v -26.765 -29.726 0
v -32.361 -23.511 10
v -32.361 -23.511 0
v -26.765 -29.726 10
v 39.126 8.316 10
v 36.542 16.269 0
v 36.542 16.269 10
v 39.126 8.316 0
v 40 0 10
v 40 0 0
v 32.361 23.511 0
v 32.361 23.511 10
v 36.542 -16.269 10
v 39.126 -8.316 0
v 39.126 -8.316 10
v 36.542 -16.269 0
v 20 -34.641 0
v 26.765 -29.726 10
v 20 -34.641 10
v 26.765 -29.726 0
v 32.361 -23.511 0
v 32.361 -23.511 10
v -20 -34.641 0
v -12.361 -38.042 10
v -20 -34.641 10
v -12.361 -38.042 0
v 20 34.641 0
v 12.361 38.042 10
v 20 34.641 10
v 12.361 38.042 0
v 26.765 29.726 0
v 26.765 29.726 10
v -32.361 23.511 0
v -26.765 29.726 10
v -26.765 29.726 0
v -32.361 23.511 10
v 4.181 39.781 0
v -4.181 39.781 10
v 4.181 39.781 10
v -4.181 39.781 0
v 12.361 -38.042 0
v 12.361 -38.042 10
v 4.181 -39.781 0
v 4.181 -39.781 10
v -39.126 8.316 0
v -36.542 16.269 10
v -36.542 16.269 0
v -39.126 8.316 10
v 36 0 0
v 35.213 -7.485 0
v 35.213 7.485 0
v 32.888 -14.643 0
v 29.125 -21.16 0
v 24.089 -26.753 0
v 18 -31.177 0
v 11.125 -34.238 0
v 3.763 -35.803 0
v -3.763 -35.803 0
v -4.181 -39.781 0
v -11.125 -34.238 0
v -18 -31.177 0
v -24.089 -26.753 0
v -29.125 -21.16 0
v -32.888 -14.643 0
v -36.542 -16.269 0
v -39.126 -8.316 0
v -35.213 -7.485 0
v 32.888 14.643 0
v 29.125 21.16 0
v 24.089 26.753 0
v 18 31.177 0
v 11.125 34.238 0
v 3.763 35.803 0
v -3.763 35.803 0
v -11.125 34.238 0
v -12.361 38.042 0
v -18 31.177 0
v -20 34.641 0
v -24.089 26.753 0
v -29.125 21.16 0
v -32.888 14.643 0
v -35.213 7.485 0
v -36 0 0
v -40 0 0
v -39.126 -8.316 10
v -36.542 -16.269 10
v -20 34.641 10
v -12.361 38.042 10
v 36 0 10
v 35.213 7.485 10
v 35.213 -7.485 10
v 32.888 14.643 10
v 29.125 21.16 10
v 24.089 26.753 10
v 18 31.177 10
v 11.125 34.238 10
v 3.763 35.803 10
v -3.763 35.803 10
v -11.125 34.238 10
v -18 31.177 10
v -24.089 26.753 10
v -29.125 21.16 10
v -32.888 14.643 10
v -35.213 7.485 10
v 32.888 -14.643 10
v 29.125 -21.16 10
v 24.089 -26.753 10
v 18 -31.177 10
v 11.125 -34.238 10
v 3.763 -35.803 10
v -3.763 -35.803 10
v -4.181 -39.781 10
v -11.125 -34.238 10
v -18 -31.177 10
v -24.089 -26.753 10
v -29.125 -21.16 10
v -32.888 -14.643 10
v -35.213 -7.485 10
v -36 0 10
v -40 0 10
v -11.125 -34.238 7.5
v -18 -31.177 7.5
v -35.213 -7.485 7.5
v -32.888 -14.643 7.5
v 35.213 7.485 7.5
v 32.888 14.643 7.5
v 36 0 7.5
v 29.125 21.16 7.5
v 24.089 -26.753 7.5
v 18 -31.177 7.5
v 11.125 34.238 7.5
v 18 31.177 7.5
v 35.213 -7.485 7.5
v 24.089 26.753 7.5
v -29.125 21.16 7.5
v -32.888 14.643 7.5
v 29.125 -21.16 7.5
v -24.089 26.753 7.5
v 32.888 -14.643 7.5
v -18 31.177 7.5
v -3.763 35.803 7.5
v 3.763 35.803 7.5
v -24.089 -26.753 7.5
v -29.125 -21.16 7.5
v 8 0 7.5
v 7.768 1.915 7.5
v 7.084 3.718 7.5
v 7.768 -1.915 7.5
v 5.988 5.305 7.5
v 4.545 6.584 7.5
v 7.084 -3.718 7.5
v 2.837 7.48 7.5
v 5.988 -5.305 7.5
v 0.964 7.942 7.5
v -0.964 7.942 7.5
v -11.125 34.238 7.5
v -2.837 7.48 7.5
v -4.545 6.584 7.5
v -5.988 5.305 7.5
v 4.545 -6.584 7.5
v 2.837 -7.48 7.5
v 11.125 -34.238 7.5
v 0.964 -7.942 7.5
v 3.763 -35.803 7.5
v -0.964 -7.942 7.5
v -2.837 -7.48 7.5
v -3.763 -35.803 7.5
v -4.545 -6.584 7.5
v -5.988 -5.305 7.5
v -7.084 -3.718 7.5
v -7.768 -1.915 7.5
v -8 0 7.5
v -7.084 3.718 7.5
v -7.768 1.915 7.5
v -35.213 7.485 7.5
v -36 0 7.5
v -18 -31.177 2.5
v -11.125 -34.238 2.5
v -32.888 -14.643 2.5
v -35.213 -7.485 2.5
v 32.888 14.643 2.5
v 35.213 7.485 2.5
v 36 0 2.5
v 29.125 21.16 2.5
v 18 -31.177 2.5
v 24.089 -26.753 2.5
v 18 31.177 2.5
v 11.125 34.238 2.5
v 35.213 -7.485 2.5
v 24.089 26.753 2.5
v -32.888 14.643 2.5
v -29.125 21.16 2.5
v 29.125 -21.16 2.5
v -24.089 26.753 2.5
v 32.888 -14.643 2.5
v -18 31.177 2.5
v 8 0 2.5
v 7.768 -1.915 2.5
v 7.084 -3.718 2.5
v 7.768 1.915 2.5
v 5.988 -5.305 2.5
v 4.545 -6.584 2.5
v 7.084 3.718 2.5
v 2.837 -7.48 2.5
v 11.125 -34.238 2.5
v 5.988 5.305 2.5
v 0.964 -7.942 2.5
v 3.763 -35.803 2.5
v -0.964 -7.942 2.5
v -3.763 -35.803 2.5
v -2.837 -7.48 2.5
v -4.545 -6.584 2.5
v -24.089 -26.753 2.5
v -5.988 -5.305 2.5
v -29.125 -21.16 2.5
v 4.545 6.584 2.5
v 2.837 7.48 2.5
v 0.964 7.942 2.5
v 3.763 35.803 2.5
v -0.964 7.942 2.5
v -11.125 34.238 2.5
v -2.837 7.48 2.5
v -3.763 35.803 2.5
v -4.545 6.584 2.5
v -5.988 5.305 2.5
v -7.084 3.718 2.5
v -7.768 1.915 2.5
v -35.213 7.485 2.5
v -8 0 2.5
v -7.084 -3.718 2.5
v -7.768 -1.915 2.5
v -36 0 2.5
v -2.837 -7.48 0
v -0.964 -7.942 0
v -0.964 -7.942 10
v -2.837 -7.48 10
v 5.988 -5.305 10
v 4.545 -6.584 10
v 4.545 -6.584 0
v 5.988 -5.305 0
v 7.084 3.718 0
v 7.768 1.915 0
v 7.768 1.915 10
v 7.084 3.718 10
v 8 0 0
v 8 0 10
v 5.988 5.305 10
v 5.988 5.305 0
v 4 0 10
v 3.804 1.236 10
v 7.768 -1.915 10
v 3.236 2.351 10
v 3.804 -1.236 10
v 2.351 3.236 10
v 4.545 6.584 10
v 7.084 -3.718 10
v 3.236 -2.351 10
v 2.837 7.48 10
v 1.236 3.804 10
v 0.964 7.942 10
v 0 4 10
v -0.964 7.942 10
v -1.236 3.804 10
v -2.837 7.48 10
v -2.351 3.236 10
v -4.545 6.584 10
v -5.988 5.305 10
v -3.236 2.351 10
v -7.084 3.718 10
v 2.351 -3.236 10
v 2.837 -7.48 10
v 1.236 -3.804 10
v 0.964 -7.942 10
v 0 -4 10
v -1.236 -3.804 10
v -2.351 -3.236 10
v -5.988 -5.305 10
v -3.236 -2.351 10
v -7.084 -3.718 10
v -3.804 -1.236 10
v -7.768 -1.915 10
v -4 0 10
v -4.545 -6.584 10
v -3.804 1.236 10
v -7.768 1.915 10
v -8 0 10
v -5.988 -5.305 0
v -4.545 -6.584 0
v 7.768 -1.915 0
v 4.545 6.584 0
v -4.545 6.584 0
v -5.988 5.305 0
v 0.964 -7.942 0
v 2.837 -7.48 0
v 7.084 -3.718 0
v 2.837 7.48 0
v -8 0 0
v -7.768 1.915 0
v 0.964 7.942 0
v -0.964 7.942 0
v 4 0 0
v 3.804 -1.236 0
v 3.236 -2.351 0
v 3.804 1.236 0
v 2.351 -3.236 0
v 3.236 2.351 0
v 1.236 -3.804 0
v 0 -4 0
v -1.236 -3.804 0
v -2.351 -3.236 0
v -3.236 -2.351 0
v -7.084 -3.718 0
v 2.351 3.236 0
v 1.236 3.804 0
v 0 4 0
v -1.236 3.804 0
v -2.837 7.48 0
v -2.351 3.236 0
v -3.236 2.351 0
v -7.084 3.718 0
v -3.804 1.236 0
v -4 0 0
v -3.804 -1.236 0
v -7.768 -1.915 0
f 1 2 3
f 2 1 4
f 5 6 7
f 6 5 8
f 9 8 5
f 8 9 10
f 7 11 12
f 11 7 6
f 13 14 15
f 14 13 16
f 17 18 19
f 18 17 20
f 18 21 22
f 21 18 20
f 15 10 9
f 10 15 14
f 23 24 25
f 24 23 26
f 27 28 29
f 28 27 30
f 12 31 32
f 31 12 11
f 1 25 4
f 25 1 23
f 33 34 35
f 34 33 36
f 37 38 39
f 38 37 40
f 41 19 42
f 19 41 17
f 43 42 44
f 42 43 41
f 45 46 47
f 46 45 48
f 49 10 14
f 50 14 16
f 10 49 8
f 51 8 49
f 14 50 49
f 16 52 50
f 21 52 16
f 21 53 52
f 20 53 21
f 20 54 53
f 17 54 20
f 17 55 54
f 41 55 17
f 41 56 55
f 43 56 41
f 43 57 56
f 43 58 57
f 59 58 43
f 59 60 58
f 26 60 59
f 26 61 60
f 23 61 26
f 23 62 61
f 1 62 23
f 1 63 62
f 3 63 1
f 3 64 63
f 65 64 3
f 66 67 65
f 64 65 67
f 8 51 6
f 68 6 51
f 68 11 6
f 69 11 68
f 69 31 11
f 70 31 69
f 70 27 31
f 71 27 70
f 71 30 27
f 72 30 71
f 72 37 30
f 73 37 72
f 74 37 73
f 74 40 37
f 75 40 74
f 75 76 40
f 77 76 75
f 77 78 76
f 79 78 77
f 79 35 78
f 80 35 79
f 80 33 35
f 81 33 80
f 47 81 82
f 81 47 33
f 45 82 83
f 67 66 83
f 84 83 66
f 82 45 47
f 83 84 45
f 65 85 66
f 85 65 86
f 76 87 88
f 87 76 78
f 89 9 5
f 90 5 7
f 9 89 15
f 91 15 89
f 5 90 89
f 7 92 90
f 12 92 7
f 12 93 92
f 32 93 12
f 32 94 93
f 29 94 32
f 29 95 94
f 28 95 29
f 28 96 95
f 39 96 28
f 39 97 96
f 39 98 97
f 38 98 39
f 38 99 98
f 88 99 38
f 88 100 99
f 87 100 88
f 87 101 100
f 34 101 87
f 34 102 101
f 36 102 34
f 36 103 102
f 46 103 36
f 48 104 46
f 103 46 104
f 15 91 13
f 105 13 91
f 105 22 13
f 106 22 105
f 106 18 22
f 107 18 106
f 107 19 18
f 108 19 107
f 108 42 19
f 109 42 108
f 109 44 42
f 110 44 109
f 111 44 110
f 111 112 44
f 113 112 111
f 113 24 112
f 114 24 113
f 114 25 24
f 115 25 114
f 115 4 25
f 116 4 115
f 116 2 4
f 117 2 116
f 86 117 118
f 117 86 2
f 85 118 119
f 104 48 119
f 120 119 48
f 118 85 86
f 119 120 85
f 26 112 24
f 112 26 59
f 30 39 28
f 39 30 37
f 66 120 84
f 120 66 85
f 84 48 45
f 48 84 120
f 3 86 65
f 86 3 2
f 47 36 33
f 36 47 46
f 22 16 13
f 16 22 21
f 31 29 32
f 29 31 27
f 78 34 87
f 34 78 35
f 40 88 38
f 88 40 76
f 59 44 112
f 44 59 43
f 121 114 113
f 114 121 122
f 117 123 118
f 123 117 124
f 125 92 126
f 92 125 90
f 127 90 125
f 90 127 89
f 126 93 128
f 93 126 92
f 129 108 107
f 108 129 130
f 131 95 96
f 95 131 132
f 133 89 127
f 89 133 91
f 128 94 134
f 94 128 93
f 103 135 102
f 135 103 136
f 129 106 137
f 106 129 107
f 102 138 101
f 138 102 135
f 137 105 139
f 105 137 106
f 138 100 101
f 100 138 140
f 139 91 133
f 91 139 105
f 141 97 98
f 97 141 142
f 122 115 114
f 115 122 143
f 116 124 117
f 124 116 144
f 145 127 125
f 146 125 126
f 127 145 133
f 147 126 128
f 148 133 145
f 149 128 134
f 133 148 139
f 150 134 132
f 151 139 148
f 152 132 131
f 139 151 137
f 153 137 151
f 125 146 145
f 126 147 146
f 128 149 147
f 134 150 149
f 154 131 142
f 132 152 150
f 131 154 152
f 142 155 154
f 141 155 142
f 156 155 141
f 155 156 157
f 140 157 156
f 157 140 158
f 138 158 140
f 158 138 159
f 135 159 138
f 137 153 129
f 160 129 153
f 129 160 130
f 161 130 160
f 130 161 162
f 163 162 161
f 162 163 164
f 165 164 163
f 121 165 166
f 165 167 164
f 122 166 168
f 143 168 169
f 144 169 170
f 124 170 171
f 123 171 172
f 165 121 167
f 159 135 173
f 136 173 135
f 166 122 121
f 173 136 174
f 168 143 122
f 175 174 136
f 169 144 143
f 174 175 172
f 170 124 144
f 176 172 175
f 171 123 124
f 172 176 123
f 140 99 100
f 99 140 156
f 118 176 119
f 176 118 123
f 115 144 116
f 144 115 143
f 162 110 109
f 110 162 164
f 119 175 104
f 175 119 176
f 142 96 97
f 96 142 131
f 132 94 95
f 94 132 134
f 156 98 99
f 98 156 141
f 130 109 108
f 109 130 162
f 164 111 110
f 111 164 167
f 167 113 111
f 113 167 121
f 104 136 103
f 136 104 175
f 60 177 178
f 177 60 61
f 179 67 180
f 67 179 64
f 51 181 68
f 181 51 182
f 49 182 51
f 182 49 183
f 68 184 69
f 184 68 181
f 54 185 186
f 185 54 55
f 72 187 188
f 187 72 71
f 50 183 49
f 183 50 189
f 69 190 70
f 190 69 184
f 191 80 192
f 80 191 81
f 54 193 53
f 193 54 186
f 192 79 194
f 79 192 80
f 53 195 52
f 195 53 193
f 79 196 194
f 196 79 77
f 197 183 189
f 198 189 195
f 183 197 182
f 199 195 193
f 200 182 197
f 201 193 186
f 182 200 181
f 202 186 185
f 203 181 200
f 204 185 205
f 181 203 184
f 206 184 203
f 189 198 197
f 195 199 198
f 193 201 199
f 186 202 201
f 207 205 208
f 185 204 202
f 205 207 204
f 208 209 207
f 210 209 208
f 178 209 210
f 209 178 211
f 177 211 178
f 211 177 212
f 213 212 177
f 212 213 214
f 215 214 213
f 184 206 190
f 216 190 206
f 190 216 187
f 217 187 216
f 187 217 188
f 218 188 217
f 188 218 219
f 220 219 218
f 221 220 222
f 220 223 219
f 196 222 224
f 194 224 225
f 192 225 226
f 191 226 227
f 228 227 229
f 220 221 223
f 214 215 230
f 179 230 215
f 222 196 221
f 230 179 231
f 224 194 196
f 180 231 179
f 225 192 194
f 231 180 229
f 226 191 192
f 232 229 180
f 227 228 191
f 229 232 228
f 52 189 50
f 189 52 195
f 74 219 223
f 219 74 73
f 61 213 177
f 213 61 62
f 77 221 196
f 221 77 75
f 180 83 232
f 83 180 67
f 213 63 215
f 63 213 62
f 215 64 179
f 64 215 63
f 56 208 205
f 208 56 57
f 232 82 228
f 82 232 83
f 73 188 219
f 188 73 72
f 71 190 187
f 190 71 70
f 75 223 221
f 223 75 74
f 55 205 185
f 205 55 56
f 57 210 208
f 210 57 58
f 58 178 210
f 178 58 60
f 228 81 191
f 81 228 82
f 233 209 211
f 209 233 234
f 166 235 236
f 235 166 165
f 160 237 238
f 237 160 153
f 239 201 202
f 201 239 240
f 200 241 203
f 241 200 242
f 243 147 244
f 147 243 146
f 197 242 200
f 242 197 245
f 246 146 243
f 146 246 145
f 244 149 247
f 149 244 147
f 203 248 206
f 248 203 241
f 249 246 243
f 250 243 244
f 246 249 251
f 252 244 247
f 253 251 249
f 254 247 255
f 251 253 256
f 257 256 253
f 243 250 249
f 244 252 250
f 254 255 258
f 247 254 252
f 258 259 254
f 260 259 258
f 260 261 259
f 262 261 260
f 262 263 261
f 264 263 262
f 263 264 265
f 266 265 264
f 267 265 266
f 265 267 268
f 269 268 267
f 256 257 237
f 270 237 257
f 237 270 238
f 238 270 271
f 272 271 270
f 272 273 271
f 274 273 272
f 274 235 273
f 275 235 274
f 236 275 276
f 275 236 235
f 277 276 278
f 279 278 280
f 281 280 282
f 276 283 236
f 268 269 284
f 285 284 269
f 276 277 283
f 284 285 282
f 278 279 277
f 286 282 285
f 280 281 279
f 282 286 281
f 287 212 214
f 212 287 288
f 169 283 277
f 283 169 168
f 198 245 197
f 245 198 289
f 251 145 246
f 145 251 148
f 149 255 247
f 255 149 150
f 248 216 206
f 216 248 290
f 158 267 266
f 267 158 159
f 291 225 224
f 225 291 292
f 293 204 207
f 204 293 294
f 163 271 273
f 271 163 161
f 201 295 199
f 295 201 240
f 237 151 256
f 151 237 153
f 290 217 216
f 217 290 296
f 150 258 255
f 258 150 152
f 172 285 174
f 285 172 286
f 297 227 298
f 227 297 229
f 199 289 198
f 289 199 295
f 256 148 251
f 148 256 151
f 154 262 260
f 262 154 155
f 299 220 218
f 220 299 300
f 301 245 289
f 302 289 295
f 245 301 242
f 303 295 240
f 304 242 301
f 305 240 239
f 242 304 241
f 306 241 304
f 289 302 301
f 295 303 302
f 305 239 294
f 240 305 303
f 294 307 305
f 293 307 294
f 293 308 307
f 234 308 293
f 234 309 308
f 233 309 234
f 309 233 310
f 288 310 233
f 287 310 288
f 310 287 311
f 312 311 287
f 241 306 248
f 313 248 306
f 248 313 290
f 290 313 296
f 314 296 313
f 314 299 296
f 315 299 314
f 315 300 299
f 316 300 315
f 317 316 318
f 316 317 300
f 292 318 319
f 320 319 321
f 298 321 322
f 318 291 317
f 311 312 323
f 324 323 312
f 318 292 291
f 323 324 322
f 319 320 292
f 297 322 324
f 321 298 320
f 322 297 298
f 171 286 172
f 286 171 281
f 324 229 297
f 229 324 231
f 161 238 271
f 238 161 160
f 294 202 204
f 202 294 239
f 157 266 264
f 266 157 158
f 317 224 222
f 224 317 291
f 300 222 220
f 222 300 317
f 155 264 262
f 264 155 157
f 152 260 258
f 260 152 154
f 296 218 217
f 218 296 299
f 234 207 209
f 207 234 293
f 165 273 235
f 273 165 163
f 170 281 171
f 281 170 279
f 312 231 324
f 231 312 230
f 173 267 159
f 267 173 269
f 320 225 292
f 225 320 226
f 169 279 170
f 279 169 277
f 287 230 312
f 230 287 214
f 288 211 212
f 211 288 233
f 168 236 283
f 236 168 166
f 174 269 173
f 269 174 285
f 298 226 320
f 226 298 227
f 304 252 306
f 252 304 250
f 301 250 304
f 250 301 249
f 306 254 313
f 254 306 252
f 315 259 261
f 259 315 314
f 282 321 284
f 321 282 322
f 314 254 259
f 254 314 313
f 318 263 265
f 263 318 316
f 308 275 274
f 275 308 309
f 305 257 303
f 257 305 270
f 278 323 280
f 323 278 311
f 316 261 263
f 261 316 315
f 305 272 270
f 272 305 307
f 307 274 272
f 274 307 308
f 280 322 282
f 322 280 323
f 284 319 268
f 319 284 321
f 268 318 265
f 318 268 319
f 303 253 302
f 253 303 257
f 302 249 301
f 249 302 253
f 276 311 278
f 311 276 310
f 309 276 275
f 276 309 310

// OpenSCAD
module wheel_body(diameter=20,width=4,hub_diameter=6) {
    difference() {   
        union(){
                
            difference(){ 
                cylinder(width,diameter,diameter);
                dz = width * 0.75;
                translate([0,0,dz]) 
                    cylinder(width,diameter-4,diameter-4);
                translate([0,0,-dz])  
                    cylinder(width,diameter-4,diameter-4);
            }
            
            cylinder(width,hub_diameter,hub_diameter);
           
        }
        translate([0,0,-50]) cylinder(100,hub_diameter-4,hub_diameter-4, $fn=20);
    }
}

module peg(){
    translate([0,-34,5]) 
    rotate([90,0,0]) 
    cylinder(6,2,2,$fn=20);
}

module wheel(){
    wheel_body(40,10,8);    
}

wheel();
